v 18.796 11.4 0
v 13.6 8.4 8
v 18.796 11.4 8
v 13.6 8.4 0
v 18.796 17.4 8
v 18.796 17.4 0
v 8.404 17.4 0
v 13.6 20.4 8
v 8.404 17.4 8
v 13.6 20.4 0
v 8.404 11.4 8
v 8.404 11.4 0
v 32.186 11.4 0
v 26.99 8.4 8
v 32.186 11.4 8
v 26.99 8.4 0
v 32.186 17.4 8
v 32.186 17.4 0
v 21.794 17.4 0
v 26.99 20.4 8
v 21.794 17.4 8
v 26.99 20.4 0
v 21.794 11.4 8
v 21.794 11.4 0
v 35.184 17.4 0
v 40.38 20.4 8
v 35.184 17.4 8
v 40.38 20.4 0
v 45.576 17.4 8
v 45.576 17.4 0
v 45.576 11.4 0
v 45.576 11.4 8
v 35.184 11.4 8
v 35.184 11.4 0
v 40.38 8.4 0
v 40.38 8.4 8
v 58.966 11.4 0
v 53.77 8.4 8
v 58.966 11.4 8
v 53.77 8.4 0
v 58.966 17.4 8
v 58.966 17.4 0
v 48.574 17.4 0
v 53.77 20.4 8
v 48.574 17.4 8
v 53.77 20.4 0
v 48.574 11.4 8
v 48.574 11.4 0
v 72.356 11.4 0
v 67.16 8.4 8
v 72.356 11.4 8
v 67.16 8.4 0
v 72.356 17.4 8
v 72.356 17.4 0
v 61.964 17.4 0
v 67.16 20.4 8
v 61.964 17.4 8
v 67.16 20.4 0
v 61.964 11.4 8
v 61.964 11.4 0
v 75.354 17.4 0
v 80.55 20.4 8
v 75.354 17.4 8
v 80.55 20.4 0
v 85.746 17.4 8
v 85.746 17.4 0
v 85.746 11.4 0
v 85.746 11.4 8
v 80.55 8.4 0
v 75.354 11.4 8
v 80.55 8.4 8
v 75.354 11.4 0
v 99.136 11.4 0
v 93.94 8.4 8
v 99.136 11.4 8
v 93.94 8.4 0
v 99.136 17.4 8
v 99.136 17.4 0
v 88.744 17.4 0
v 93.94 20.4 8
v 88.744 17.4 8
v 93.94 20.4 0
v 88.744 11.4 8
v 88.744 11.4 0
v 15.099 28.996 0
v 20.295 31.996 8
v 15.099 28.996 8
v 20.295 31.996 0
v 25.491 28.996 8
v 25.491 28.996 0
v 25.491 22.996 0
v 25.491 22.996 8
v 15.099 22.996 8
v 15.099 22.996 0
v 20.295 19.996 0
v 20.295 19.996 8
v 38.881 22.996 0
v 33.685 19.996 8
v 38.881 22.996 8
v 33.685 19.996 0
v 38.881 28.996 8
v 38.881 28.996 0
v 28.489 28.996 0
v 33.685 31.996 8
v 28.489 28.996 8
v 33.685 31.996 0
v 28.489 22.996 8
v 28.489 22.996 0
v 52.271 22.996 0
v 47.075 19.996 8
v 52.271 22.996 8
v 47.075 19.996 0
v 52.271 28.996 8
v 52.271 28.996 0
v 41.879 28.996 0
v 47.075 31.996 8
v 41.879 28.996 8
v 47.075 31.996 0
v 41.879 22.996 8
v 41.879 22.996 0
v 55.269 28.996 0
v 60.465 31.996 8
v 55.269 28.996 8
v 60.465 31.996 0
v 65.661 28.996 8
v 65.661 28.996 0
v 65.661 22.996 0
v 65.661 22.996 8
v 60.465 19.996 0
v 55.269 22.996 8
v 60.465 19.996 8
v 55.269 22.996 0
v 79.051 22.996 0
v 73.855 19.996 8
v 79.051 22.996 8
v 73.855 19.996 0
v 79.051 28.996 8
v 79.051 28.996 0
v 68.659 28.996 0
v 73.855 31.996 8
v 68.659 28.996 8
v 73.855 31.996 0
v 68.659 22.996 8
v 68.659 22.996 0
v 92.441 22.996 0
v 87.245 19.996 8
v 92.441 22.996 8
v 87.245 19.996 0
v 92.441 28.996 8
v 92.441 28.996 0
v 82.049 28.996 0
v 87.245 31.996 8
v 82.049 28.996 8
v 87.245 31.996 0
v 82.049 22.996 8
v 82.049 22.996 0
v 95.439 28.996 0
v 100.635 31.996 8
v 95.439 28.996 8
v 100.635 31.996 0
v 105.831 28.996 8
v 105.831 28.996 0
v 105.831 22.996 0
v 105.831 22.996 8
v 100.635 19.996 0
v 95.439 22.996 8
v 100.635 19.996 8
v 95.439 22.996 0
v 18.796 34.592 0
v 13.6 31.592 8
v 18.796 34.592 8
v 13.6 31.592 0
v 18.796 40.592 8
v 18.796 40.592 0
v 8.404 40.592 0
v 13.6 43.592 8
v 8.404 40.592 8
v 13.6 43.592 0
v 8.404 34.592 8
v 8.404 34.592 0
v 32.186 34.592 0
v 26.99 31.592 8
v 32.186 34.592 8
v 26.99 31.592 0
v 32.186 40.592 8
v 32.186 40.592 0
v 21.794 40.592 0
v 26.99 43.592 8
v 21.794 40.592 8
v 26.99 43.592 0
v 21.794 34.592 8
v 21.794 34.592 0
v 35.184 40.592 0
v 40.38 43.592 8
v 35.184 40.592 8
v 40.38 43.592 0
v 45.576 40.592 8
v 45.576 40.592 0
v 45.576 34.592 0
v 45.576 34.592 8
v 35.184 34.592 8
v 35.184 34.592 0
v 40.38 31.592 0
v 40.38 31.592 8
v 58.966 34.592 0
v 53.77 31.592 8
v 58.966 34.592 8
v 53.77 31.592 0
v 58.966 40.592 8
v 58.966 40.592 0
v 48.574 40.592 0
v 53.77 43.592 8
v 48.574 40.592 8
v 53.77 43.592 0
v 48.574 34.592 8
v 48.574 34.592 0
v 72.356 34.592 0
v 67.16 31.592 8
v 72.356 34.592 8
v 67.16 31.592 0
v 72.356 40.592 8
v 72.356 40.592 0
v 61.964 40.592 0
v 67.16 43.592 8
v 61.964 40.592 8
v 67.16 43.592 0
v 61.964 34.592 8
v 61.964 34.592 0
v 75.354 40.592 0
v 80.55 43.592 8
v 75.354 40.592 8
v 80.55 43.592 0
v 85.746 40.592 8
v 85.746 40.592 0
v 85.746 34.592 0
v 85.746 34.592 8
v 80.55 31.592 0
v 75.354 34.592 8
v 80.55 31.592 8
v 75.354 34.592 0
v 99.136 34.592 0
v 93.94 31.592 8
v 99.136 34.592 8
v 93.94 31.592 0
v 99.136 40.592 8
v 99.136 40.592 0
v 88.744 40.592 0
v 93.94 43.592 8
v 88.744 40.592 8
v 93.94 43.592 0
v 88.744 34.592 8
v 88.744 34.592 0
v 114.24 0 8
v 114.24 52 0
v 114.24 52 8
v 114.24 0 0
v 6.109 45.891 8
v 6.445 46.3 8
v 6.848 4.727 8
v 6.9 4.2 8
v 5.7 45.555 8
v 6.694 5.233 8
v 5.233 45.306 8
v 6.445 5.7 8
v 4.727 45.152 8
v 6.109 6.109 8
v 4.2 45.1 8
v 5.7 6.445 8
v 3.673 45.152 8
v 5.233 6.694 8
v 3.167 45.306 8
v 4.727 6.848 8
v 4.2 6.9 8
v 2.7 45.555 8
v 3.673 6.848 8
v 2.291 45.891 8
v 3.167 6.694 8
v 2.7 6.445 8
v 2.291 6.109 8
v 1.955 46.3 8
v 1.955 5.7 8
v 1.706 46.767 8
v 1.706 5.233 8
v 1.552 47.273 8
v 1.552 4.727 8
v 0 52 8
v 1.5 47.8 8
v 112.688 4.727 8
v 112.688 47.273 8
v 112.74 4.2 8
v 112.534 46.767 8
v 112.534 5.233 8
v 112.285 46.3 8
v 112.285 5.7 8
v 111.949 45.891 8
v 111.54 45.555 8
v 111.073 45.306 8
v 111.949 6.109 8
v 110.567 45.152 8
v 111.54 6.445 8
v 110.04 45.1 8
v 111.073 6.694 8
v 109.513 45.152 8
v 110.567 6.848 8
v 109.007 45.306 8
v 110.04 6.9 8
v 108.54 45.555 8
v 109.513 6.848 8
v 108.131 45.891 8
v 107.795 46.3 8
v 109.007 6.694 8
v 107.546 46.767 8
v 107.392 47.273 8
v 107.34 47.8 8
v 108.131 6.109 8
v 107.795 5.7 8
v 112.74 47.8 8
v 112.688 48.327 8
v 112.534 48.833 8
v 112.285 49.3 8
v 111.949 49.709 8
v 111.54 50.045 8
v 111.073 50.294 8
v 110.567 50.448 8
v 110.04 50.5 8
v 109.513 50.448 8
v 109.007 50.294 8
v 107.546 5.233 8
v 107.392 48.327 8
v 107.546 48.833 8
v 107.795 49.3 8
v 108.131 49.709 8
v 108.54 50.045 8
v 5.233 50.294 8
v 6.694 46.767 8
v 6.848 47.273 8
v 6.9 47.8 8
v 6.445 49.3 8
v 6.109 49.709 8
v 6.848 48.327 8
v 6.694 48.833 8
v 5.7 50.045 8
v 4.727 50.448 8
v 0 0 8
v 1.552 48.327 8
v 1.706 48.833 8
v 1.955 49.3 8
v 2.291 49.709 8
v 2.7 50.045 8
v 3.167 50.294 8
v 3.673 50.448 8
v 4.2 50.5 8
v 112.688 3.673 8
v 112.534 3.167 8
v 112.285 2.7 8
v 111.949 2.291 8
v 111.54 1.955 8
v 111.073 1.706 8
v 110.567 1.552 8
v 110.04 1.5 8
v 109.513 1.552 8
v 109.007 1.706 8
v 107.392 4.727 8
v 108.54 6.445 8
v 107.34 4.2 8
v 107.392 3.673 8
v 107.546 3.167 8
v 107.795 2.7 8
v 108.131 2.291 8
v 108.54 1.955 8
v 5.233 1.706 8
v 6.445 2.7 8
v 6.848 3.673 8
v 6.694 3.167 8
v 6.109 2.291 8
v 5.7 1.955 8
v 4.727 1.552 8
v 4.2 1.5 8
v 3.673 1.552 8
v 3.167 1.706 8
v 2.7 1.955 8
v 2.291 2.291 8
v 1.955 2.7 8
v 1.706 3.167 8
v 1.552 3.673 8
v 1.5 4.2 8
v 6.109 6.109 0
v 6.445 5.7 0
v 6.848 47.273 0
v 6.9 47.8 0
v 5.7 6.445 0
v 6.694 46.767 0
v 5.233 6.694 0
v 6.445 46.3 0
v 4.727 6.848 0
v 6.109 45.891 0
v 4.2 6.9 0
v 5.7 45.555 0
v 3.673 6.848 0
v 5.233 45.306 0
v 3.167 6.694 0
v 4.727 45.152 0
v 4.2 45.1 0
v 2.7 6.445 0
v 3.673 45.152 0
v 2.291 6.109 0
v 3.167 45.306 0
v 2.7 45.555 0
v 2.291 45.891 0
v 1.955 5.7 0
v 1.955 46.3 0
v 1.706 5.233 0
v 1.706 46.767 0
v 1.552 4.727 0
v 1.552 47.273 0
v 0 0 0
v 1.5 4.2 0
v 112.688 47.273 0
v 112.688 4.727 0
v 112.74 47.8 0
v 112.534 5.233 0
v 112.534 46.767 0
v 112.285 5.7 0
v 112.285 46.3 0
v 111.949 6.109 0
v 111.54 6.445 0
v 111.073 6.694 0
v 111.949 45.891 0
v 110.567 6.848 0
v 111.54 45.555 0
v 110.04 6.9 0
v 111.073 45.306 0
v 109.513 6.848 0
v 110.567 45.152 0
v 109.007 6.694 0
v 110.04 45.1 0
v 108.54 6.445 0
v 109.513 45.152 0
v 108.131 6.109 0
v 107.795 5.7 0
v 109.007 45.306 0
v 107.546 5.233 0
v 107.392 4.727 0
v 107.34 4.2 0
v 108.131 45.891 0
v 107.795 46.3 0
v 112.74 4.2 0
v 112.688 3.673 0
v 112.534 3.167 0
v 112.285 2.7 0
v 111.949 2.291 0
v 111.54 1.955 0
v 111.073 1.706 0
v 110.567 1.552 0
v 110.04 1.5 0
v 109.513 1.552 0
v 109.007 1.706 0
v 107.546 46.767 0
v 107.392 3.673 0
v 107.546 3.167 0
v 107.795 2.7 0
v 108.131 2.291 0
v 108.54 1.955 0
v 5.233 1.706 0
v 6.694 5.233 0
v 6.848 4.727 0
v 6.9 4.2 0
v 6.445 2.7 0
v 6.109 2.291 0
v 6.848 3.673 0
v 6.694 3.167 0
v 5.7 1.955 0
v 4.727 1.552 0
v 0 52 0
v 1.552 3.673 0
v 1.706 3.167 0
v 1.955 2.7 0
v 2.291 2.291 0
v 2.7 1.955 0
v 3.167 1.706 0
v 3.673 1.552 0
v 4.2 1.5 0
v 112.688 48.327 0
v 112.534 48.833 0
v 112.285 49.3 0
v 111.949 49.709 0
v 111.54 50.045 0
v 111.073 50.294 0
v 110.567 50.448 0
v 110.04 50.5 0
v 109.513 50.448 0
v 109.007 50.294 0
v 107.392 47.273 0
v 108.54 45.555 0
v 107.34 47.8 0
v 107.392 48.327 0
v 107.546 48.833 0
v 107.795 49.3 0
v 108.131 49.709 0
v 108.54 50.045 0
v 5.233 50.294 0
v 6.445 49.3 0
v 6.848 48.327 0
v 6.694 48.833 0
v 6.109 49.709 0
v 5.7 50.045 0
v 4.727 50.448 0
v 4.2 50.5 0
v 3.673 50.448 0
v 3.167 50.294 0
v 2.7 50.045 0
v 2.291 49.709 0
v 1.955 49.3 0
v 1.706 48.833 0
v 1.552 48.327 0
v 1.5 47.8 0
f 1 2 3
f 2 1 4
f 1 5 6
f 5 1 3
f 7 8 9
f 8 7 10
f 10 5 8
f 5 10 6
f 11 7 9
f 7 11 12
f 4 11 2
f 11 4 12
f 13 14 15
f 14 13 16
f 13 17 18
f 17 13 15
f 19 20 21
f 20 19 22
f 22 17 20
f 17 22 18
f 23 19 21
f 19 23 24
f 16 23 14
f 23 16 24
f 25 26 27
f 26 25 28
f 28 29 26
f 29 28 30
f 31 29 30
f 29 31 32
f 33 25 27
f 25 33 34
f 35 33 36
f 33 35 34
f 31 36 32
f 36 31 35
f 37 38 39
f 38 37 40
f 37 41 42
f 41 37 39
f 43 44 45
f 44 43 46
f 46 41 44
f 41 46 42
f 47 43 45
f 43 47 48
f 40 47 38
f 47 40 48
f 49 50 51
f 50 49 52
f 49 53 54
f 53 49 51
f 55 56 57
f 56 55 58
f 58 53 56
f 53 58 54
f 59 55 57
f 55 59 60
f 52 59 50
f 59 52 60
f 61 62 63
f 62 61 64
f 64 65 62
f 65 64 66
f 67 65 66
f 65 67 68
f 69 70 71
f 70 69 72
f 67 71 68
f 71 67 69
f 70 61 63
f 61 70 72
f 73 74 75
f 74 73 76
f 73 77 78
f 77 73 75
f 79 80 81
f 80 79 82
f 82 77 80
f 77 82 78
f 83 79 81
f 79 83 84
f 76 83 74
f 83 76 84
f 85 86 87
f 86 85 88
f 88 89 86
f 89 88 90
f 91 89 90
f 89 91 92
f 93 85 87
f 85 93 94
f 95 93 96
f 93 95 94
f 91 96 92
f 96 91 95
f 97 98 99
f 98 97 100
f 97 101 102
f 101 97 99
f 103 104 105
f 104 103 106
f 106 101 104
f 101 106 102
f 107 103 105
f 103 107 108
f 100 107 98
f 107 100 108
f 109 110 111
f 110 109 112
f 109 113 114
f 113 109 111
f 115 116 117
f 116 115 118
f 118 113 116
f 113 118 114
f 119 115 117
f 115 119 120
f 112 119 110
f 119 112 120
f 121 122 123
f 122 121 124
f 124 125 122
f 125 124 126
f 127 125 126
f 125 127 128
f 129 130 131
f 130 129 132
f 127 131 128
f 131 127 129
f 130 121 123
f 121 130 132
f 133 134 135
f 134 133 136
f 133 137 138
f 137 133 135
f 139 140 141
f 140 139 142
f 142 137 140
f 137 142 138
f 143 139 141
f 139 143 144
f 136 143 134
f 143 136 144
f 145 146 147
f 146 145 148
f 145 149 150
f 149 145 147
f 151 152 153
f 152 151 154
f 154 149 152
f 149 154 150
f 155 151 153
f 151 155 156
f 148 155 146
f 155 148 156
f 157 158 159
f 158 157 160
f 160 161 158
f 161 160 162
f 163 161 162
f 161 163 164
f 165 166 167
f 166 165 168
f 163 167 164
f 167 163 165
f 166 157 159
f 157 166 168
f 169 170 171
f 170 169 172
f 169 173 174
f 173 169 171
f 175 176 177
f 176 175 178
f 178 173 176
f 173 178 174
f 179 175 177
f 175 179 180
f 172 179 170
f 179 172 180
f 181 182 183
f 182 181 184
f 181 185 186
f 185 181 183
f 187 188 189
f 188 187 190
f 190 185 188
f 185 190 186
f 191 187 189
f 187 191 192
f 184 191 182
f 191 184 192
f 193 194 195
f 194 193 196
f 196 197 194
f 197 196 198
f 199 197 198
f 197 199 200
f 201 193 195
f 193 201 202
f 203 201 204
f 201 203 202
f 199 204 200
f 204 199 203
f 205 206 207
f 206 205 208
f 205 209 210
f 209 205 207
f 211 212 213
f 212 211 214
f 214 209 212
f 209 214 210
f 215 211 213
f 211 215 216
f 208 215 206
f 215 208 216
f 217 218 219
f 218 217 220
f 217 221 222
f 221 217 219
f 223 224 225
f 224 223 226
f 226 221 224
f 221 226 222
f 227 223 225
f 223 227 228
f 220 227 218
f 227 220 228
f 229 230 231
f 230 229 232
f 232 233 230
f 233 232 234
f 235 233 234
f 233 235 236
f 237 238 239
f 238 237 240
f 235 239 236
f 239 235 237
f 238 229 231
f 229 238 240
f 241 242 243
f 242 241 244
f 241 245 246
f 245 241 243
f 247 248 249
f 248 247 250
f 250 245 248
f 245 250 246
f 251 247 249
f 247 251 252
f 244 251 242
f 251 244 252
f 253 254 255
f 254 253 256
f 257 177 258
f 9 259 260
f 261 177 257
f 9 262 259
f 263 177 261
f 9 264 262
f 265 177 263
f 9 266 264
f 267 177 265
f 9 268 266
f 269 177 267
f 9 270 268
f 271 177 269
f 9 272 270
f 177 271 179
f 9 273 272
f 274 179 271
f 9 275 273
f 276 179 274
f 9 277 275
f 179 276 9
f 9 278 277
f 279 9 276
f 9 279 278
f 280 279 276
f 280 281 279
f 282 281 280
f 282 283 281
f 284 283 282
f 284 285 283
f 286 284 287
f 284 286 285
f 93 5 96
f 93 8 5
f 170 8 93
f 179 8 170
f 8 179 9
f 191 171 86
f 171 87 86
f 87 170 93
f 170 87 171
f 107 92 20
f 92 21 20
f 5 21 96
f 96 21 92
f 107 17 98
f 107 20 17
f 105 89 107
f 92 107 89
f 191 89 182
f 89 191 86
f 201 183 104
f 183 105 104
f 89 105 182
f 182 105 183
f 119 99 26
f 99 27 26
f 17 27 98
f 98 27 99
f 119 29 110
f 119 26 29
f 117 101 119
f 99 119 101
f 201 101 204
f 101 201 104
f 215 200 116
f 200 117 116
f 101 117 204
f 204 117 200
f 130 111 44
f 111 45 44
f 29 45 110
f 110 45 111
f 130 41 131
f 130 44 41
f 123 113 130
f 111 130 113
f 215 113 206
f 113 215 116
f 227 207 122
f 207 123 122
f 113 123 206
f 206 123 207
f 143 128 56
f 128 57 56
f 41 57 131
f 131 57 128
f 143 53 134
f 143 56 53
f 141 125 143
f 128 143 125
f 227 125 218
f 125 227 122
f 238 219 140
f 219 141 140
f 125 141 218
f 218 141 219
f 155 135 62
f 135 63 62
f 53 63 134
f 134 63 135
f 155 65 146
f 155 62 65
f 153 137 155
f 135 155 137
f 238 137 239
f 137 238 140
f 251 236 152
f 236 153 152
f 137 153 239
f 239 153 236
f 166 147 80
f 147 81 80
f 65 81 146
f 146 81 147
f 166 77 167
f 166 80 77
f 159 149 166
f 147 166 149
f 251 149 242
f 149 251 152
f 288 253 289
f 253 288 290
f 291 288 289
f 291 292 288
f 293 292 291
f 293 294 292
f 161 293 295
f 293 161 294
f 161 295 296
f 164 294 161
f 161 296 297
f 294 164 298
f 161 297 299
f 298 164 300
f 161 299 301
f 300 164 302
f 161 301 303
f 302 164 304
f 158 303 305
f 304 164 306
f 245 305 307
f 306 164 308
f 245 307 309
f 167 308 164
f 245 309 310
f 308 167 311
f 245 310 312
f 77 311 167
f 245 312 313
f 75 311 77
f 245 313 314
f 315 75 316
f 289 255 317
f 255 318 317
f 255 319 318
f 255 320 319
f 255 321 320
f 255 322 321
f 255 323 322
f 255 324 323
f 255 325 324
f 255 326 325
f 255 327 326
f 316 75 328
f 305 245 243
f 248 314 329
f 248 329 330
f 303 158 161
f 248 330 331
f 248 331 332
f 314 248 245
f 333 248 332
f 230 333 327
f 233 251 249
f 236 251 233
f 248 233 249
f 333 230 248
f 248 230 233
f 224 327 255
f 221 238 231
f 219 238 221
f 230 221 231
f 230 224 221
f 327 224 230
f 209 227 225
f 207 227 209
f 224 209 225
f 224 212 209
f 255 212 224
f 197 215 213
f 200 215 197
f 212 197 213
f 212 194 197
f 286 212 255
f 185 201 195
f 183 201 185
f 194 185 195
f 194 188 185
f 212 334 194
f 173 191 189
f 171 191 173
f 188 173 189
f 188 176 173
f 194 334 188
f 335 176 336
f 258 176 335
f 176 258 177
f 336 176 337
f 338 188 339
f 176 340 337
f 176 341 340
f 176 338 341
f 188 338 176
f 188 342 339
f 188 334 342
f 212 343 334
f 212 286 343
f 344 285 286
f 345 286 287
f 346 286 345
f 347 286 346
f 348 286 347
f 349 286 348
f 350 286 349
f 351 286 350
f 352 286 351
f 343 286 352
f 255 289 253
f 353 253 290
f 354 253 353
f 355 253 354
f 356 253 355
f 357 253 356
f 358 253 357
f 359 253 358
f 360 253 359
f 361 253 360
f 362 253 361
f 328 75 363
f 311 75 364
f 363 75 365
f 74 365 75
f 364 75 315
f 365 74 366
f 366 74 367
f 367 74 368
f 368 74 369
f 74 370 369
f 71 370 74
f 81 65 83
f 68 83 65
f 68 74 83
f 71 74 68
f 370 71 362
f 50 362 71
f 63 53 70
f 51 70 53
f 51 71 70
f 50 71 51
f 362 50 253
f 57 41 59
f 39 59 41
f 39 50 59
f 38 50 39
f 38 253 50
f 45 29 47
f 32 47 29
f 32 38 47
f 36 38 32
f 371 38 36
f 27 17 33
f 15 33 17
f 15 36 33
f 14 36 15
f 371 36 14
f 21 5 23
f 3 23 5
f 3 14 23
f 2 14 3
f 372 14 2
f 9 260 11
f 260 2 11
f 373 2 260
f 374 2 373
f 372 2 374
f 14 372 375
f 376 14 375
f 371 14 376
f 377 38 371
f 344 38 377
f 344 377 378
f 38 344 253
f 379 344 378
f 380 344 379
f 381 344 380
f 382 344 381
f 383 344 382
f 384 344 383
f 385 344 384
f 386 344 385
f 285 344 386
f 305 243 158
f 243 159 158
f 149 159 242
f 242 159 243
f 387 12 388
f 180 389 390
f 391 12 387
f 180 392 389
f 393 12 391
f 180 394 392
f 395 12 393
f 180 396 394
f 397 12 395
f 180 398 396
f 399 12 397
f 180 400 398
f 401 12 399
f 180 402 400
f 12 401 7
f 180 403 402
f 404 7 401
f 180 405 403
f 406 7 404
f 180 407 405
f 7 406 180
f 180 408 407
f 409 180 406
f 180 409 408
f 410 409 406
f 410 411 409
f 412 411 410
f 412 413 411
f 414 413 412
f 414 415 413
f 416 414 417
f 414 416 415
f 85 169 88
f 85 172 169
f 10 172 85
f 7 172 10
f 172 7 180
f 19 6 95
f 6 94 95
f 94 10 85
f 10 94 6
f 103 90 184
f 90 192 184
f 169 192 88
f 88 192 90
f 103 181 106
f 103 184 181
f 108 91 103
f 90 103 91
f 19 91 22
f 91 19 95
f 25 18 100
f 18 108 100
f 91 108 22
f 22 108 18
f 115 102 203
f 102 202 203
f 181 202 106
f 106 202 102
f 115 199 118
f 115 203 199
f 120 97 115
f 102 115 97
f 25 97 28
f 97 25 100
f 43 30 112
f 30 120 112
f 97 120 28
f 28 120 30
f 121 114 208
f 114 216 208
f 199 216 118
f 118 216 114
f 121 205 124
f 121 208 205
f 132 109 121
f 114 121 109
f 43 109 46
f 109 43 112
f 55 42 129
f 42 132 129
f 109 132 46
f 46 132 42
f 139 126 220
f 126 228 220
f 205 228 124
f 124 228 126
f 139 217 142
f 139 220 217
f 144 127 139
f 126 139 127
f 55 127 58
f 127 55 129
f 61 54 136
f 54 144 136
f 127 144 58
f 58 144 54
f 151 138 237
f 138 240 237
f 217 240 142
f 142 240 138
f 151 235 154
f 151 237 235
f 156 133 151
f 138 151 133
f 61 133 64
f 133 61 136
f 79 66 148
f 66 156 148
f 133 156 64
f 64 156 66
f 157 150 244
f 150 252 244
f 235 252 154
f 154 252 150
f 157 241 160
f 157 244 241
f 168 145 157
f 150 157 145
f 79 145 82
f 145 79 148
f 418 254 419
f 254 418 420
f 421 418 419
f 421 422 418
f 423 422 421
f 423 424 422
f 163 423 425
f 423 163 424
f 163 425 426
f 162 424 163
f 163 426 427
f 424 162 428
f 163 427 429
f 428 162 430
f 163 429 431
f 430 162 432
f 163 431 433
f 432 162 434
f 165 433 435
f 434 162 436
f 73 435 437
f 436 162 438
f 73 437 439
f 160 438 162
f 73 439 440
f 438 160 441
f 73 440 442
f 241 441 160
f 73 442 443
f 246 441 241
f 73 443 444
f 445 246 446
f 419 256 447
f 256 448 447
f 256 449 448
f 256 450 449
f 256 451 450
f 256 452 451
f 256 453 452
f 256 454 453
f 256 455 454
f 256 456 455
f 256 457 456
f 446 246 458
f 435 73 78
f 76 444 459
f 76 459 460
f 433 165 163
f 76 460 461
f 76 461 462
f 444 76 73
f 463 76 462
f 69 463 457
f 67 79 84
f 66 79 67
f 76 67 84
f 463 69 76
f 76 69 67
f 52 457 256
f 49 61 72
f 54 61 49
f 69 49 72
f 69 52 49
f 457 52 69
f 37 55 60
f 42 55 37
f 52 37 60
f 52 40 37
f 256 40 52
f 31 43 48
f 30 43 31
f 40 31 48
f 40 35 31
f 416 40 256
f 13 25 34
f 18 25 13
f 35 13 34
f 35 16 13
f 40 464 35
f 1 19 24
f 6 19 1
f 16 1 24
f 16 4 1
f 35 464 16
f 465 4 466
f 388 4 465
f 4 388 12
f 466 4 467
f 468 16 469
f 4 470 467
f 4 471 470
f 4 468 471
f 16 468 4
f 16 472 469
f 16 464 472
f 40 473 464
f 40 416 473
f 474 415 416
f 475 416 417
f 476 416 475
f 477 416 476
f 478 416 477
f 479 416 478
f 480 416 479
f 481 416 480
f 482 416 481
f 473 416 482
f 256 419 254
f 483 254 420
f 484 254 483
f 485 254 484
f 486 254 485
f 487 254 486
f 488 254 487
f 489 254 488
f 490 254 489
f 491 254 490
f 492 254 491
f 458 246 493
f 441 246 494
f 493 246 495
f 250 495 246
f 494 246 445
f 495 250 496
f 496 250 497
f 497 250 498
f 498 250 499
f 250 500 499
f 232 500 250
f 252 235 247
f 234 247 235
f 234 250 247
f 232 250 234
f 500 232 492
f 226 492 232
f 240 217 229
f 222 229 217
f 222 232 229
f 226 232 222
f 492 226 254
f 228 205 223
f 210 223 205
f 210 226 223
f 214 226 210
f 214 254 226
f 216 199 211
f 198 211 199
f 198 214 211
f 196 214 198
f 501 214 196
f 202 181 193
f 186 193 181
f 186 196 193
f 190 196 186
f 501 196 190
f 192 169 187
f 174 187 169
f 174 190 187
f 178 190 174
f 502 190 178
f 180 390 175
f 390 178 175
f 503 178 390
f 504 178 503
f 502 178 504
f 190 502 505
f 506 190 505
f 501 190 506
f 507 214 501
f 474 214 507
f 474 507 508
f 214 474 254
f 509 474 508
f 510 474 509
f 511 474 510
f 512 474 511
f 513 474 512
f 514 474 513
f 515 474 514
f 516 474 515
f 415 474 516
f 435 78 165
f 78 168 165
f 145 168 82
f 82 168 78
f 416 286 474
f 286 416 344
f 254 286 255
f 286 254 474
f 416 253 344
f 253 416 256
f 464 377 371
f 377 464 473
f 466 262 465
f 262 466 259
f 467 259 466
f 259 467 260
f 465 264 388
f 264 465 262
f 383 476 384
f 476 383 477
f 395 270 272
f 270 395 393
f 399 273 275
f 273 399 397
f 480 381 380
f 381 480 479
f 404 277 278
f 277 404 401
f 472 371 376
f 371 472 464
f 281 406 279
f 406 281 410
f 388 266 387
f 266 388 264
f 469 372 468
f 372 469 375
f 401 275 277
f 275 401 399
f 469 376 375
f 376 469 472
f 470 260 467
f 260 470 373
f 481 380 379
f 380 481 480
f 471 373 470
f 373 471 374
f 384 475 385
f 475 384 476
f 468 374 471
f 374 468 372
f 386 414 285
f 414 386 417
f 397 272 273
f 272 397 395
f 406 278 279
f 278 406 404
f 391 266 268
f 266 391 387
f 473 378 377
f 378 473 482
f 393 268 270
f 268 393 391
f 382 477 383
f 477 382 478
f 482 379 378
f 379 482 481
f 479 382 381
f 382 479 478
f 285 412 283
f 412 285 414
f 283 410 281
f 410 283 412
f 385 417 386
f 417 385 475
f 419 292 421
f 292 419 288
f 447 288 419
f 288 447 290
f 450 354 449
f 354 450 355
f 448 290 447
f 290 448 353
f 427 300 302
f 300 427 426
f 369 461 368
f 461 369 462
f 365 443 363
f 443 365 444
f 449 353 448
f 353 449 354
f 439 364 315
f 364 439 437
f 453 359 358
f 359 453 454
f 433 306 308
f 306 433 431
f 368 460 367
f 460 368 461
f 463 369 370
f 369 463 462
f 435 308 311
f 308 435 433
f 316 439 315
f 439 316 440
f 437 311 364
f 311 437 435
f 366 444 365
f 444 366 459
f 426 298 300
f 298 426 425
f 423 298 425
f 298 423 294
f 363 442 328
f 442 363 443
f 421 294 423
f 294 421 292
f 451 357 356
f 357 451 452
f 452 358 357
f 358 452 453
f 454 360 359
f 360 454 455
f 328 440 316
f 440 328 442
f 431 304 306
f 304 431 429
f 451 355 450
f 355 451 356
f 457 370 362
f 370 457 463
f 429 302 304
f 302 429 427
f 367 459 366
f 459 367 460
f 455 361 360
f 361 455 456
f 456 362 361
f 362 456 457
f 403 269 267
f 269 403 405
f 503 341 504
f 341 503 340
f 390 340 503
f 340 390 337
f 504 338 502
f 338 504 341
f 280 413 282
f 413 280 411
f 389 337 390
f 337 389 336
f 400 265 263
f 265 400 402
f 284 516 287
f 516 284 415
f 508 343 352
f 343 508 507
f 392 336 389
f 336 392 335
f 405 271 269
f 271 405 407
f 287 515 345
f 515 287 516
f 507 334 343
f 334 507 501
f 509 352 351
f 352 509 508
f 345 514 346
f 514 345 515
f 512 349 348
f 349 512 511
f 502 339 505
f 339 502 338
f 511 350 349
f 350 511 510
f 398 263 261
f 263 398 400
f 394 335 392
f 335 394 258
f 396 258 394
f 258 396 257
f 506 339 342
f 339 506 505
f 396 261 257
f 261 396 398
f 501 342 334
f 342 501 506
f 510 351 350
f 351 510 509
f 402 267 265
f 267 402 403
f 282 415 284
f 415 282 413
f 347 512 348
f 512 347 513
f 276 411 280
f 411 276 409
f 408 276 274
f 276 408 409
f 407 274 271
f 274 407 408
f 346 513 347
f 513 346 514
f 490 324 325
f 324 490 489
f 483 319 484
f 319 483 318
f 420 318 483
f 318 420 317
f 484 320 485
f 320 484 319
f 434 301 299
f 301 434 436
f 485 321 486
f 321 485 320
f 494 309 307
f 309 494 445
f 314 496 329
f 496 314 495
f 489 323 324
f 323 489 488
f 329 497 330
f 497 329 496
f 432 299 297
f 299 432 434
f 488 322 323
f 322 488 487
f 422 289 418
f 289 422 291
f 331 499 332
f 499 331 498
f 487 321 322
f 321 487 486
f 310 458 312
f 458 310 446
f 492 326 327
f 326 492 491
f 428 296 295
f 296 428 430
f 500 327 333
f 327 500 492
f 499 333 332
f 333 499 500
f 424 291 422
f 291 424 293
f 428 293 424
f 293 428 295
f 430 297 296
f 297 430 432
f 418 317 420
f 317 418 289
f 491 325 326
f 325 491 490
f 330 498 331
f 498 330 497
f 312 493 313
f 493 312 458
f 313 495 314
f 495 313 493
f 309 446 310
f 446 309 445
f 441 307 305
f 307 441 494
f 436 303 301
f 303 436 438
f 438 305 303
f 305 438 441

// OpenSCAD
$fn = 32;

// ----------------------------------------------------------------------
// Honeycomb panel: 114.24 x 52 mm, 21 cells of 12 mm
// ----------------------------------------------------------------------

// --- parameters (mm) ---
panel_w = 114.24;         // panel width
panel_d = 52;             // panel depth
thick = 8;                // panel thickness
cell_r = 6;               // hex cell circumradius
pitch = 13.39;            // hex cell pitch (centre to centre)
web = 3;                  // web between the cells
columns = 7;              // columns of cells
rows = 3;                 // rows of cells
cell_count = 21;          // total cells
shift_x = 13.6;           // first cell offset in x
shift_y = 14.4;           // first cell offset in y
mount_d = 5.4;            // corner mounting holes
hole_off = 4.2;           // mounting hole offset from the corners

difference() {
  union() {
    cube([panel_w, panel_d, thick]);
  }
  /* hexagonal cells, point-up, cut right through the plate */
  for (row = [0 : rows - 1]) {
    for (col = [0 : columns - 1]) {
      translate([shift_x + col * pitch + (row % 2) * pitch / 2, shift_y + row * pitch * 0.866025, -2.5]) rotate([0, 0, 30]) cylinder(h = thick + 5, d = 2 * cell_r, $fn = 6);
    }
  }
  /* corner mounting holes, clear of the outer cell web */
  translate([4.2, 4.2, -2.5]) cylinder(h = thick + 5, d = mount_d);
  translate([110.04, 4.2, -2.5]) cylinder(h = thick + 5, d = mount_d);
  translate([4.2, 47.8, -2.5]) cylinder(h = thick + 5, d = mount_d);
  translate([110.04, 47.8, -2.5]) cylinder(h = thick + 5, d = mount_d);
}
